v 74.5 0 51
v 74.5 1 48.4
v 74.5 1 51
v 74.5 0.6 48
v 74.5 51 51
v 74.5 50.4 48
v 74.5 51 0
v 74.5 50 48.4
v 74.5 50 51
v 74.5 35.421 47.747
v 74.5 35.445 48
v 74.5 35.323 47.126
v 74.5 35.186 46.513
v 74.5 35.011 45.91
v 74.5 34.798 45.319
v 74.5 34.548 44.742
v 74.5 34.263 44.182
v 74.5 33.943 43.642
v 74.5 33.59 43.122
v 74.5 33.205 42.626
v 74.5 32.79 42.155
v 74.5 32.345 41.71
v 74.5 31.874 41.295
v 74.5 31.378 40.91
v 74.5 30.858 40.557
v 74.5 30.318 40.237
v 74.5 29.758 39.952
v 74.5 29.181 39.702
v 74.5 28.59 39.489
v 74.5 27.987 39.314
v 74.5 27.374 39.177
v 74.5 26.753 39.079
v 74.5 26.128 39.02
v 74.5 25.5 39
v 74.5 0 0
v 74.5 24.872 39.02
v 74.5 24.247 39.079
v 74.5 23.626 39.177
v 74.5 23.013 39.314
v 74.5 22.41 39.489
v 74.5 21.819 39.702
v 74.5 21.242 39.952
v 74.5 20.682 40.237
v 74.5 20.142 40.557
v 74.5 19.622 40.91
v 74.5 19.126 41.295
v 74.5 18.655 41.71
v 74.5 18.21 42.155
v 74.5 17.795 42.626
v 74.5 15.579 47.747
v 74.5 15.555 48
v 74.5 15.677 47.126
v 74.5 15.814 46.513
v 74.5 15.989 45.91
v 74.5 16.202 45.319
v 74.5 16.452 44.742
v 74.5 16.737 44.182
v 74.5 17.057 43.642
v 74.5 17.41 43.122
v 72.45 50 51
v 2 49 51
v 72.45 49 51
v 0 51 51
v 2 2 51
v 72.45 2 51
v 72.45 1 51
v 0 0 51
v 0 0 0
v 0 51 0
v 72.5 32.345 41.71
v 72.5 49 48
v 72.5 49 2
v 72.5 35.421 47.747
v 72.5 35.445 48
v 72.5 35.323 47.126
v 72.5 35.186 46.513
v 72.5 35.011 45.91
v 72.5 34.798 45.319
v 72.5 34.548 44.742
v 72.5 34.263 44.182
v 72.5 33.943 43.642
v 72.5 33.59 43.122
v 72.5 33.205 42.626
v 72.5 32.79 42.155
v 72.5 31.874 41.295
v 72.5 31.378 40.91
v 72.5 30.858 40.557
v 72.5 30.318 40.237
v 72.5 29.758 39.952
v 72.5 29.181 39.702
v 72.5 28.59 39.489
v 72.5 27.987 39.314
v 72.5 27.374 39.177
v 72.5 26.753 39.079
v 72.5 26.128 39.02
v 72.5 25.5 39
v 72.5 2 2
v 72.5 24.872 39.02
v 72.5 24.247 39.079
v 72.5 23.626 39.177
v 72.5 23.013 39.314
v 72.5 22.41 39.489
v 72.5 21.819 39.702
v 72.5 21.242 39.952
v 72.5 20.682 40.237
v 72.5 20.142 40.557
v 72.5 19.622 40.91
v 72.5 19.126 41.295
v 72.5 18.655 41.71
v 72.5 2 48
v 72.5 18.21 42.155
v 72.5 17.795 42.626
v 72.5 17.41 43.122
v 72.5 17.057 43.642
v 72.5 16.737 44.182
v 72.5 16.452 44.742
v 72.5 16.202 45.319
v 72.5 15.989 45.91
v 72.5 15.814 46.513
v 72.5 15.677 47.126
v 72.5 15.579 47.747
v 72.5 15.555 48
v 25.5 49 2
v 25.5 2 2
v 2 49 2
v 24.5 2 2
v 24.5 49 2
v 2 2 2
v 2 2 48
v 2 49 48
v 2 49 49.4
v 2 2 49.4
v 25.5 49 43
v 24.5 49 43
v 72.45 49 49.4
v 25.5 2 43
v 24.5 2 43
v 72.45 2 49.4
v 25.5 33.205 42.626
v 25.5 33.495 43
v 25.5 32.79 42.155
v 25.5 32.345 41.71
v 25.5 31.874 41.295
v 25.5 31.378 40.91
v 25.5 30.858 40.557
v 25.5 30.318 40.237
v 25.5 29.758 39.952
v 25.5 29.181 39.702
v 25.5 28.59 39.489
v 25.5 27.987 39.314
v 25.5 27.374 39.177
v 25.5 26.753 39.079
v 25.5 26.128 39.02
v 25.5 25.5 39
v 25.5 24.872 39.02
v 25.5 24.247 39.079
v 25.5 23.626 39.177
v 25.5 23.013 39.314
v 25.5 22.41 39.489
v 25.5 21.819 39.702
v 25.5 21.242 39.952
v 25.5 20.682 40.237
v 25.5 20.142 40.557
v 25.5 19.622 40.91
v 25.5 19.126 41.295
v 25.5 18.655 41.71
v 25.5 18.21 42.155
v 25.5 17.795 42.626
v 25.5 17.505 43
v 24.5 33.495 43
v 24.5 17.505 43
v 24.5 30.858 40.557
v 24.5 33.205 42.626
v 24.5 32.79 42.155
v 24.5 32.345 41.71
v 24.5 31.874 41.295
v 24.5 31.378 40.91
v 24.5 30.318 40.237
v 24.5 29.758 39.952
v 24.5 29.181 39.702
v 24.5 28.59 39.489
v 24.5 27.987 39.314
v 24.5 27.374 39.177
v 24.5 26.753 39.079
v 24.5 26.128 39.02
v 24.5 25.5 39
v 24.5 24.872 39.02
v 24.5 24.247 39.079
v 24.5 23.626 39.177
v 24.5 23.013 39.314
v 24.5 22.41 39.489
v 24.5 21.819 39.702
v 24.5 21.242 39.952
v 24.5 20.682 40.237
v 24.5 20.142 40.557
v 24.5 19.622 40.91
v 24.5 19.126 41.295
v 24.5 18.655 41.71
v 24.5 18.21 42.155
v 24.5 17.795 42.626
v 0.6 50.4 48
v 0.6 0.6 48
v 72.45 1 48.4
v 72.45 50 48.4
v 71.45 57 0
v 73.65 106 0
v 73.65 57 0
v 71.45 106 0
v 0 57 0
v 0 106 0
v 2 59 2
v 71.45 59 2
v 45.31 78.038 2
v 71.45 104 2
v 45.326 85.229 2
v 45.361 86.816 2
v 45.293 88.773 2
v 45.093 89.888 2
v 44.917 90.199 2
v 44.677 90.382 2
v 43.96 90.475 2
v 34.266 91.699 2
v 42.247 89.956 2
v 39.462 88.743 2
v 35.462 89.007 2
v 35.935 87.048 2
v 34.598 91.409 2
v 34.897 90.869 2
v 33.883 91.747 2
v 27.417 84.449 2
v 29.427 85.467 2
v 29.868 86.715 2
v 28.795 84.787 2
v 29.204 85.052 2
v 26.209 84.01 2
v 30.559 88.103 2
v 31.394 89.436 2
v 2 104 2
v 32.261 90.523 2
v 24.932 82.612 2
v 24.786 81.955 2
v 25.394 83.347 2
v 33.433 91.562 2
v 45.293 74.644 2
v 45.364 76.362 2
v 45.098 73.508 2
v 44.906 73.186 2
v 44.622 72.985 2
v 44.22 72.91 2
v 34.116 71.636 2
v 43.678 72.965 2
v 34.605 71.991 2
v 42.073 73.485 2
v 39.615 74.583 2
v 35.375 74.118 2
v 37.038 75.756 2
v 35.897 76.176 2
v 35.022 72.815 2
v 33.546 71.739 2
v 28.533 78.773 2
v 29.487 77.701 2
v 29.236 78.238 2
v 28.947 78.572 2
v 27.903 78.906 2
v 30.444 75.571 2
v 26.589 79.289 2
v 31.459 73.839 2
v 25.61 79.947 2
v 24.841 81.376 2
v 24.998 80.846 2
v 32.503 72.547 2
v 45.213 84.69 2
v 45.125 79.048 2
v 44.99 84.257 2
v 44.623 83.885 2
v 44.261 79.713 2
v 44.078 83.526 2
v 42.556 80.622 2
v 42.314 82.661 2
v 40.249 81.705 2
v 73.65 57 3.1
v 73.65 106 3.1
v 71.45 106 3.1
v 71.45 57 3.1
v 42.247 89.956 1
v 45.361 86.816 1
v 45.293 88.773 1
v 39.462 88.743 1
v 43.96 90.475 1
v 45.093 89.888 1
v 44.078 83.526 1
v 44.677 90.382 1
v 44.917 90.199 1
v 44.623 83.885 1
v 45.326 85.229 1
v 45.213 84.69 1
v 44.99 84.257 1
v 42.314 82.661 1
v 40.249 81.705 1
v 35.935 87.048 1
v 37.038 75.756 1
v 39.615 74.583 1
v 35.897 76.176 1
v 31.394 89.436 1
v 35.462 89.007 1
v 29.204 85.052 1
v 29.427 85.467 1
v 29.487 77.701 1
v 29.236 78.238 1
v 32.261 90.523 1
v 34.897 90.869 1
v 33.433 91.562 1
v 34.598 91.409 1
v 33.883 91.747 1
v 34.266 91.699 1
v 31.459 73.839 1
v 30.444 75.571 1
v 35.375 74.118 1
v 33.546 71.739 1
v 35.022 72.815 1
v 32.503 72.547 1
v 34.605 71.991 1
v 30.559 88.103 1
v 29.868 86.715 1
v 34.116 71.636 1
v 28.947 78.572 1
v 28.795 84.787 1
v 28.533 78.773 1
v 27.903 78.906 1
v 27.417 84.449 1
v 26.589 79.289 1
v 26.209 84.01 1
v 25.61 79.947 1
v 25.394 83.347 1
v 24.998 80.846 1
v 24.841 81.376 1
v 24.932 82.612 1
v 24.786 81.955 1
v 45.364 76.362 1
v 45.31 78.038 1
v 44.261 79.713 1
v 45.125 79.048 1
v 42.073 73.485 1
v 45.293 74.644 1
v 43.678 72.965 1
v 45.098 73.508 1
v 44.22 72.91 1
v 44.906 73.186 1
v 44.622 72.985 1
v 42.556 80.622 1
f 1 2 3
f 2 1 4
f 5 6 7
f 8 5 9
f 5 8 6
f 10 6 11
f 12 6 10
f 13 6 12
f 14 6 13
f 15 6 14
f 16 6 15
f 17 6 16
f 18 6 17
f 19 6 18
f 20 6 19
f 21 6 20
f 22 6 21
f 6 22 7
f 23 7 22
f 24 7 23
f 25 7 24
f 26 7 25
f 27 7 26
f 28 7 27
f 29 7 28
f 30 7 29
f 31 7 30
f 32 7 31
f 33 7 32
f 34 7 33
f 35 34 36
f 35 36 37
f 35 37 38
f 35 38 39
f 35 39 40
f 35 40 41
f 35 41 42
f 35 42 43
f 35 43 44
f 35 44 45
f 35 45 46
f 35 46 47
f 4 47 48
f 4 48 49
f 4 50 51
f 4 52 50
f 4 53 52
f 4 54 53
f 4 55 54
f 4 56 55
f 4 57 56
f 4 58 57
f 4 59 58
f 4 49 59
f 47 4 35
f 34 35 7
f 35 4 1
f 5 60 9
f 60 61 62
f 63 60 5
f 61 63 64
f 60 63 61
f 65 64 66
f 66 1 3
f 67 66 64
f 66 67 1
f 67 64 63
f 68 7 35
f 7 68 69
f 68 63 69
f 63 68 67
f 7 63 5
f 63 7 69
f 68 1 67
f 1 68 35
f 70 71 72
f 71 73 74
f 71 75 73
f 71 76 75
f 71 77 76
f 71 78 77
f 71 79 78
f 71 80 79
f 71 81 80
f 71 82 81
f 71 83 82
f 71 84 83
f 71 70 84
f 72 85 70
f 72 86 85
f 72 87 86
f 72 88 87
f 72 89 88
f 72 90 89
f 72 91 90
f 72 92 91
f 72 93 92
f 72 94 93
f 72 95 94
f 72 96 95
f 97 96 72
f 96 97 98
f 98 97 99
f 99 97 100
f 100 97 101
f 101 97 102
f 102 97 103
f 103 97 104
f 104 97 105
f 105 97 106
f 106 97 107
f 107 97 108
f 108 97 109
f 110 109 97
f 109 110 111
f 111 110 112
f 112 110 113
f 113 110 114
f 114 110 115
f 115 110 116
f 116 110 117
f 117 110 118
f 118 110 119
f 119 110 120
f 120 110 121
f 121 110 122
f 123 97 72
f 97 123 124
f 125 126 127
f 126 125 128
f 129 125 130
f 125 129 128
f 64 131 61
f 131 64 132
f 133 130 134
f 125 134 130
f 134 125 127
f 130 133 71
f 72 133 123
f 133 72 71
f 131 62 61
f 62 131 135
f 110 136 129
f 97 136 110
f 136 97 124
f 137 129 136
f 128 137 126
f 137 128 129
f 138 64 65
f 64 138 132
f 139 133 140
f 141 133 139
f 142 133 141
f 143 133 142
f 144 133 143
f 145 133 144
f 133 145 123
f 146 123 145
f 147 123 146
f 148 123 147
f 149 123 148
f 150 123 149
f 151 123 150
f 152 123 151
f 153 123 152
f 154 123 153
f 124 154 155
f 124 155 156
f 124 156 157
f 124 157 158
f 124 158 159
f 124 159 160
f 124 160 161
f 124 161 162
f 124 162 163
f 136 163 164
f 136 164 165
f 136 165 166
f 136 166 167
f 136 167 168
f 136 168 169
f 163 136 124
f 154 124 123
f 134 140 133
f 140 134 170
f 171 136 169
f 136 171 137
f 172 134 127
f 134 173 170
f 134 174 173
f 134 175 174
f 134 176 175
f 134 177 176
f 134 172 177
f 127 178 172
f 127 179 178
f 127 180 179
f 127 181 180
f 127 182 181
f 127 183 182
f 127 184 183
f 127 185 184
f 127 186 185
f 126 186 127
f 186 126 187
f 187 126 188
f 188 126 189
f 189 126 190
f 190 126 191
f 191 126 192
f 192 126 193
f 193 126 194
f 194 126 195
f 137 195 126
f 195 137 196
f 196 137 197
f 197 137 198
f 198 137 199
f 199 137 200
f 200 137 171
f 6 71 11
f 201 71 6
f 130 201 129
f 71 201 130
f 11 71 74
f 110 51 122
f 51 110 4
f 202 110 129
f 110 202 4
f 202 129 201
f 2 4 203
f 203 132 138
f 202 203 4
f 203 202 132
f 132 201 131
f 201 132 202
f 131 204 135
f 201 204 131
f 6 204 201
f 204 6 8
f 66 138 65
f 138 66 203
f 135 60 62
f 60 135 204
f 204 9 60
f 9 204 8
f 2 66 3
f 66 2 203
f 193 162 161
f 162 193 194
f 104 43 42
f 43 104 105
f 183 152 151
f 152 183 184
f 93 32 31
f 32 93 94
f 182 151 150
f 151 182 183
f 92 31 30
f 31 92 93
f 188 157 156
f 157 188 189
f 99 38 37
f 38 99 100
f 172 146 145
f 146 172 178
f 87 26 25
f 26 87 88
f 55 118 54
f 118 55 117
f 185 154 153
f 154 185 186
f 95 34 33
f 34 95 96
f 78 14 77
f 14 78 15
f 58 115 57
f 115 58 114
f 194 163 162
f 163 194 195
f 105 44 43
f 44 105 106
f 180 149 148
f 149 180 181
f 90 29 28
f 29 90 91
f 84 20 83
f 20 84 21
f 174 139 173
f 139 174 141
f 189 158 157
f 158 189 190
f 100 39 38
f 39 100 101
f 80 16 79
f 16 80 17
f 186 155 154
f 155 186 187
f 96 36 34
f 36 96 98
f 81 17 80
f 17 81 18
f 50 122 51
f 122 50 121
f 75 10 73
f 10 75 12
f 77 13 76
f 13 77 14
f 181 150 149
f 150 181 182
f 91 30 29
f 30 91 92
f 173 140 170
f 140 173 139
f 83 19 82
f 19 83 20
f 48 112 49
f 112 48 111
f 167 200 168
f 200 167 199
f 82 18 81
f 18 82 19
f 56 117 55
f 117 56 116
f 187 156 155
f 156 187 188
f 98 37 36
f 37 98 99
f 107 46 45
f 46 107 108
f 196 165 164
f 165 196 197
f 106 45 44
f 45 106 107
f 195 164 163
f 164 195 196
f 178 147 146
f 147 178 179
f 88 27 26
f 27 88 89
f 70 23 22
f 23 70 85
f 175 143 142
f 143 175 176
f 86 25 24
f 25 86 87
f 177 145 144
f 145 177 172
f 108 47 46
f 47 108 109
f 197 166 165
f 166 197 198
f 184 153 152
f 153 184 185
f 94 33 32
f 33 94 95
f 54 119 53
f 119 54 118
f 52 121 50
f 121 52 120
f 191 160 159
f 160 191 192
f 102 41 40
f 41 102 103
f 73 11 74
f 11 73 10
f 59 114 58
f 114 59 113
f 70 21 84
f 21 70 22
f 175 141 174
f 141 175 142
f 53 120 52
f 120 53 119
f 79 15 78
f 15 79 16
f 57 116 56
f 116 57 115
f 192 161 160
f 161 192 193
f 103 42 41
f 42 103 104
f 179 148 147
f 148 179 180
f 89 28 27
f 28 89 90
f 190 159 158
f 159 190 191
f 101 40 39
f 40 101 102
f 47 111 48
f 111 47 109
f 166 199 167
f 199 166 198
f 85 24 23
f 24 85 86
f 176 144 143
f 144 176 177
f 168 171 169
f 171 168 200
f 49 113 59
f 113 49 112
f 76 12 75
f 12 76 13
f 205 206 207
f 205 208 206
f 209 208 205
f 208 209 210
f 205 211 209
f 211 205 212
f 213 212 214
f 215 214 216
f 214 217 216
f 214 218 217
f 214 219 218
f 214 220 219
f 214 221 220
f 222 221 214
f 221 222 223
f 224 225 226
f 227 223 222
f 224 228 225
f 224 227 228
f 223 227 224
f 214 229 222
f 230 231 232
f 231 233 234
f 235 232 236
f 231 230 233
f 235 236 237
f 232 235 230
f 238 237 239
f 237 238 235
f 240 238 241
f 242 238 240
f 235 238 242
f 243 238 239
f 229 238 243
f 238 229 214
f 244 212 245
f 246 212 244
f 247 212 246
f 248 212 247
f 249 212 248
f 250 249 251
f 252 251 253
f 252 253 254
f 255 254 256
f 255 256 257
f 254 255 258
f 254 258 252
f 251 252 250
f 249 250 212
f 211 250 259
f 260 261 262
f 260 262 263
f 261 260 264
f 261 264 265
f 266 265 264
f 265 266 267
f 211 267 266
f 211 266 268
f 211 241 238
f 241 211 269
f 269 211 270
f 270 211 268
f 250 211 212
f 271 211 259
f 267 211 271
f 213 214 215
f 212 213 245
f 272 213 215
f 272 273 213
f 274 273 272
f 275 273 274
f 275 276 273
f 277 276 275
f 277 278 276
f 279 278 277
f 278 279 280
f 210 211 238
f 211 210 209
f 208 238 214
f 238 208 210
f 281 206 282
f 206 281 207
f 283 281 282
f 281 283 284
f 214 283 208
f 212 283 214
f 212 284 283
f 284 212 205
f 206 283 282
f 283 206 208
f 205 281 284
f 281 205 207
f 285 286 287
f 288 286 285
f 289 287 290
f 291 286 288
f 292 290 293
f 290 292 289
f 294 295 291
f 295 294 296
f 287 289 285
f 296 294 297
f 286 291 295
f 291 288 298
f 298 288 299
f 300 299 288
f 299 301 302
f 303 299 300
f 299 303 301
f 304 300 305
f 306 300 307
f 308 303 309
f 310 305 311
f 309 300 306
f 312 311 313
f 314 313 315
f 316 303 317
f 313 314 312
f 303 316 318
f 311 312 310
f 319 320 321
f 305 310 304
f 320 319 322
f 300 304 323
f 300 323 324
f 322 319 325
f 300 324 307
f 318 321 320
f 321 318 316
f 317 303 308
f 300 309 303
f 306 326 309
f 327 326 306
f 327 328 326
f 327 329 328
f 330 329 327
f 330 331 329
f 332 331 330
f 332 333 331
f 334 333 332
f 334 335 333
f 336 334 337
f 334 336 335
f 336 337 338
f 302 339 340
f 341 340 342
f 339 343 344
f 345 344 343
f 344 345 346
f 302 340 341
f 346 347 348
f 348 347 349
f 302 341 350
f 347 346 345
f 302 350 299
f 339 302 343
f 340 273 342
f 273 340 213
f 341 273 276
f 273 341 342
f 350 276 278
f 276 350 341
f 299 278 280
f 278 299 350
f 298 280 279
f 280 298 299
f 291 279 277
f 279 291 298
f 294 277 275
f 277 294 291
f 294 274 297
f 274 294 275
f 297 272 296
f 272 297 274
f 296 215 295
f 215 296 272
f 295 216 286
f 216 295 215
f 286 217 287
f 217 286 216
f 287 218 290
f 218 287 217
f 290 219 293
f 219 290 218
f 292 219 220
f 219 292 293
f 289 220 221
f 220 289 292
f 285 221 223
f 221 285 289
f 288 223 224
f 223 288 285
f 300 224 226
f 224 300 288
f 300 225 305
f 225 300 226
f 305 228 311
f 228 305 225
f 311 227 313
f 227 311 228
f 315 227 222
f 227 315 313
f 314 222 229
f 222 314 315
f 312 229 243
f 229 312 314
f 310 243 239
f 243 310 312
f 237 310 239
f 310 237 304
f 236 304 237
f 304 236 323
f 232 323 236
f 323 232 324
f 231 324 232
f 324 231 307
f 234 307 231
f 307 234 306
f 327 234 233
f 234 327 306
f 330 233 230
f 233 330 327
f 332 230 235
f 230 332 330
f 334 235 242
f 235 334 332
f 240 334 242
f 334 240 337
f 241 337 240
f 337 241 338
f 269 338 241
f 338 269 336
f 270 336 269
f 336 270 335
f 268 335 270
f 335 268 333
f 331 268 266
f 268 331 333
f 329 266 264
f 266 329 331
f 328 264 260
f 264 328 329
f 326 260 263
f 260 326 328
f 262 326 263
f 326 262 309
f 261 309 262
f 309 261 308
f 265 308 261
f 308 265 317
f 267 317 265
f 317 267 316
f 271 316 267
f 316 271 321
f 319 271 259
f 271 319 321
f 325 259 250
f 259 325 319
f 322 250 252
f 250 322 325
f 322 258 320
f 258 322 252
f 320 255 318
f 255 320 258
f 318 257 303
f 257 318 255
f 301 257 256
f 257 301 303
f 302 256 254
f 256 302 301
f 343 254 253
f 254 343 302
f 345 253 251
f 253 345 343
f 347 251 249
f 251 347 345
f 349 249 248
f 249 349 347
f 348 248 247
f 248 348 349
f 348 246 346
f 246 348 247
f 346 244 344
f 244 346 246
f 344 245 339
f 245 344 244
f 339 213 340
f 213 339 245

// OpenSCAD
// file: carcassonne_box.scad
/**
 * @file carcassonne_box.scad
 * @author Conlan Wesson
 * Template for Carcossonne boxes.
 * @copyright Creative Commons Attribution-NonCommercial-ShareAlike 4.0
 */

mm = 1;
cm = 10*mm;

width = 47*mm;
thick = 2.5*mm;
wall = 2*mm;

/**
 * Lid for box.
 * @param count Number of cards.
 * @param columns Number of columns.
 * @param icon Path to icon DXF file.
 * @param rot Icon rotation in degrees.
 * @param mult Icon scale.
 * @param xoff X-offset of icon from center.
 * @param yoff Y-offset of icon from center.
 */
module carcassonne_lid(count, columns=1, icon=false, rot=0, mult=1, xoff=0, yoff=0, g=0){
	length = (thick * count) + ((width/2) - ((thick * count) % (width/2)));
	w = length+(1.5*wall)+.1;
	l = (width*columns)+wall;
	h = wall;
	d = 2;

	CubePoints = [
		[ 0-g, 0-g,   0 ],  //0
		[ w+g, 0-g,   0 ],  //1
		[ w+g, l+g,   0 ],  //2
		[ 0-g, l+g,   0 ],  //3
		[   d,   d, h+g ],  //4
		[   w,   d, h+g ],  //5
		[   w, l-d, h+g ],  //6
		[   d, l-d, h+g ]   //7
	];
	
	CubeFaces = [
		[0,1,2,3],  // bottom
		[4,5,1,0],  // front
		[7,6,5,4],  // top
		[5,6,2,1],  // right
		[6,7,3,2],  // back
		[7,4,0,3]   // left
	];
	
	
	difference(){
		union(){
			polyhedron( CubePoints, CubeFaces );
			translate([w-wall-.15,0,0]) cube([wall+.2,l, (1.5*wall)+.1]);
		}
		if(icon){
			translate([w/2+xoff,l/3+yoff,h-(wall/2)]){
				linear_extrude(height=(wall)+.1){
					rotate(rot) scale(mult) import(icon);
				}
			}
		}
	}
}

/**
 * Carcassonne card box.
 * @param count Number of cards.
 * @param dividers Array of divider positions.
 * @param columns Number of columns.
 */
module carcassonne_box(count, dividers=[], columns=1){
	length = (thick * count) + ((width/2) - ((thick * count) % (width/2)));
	difference(){
		union(){
			difference(){
				// Outer walls
				cube([length+(2*wall), (width*columns)+(2*wall), width+(2*wall)]);
				// Cavity
				translate([wall, wall, wall]){
					cube([length, width*columns, (width+wall)+.1]);
				}
			}
			// Dividers
			for(col = [0:columns-1]){
				for(div = dividers[col]){
					translate([(div*(width/2))+(wall/2), width*col+wall, 0]) cube([wall/2, width, width-(2*wall)]);
				}
				if(col > 0){
					translate([0, width*col+(wall/2), 0]) cube([length+(2*wall), wall/2, width-(2*wall)]);
				}
			}
		}
		union(){
			// Notch
			for(col = [0:columns-1]){
				translate([wall, wall+(width*col), wall]){
					translate([0, width/2, width])
					rotate([0, 90, 0]){
						cylinder(r=10, h=length+(2*wall), $fn=100);
					}
				}
			}
			// Track
			translate([wall/2,wall/2,width+wall/2]) carcassonne_lid(count, columns, g=0.4);
		}
	}
}
// main file
/**
 * @file innscathedrals.scad
 * @author Conlan Wesson
 * Inns and Cathedrals Carcossonne box.
 * @copyright Creative Commons Attribution-NonCommercial-ShareAlike 4.0
 */

include <carcassonne_box.scad>

count = 24;
dividers = [[1]];
columns = 1;

carcassonne_box(count, dividers, columns);
translate([0,width*columns+10,0]) carcassonne_lid(count, columns, icon="innscathedrals.dxf", rot=90, mult=0.75, xoff=10, yoff=-3);
